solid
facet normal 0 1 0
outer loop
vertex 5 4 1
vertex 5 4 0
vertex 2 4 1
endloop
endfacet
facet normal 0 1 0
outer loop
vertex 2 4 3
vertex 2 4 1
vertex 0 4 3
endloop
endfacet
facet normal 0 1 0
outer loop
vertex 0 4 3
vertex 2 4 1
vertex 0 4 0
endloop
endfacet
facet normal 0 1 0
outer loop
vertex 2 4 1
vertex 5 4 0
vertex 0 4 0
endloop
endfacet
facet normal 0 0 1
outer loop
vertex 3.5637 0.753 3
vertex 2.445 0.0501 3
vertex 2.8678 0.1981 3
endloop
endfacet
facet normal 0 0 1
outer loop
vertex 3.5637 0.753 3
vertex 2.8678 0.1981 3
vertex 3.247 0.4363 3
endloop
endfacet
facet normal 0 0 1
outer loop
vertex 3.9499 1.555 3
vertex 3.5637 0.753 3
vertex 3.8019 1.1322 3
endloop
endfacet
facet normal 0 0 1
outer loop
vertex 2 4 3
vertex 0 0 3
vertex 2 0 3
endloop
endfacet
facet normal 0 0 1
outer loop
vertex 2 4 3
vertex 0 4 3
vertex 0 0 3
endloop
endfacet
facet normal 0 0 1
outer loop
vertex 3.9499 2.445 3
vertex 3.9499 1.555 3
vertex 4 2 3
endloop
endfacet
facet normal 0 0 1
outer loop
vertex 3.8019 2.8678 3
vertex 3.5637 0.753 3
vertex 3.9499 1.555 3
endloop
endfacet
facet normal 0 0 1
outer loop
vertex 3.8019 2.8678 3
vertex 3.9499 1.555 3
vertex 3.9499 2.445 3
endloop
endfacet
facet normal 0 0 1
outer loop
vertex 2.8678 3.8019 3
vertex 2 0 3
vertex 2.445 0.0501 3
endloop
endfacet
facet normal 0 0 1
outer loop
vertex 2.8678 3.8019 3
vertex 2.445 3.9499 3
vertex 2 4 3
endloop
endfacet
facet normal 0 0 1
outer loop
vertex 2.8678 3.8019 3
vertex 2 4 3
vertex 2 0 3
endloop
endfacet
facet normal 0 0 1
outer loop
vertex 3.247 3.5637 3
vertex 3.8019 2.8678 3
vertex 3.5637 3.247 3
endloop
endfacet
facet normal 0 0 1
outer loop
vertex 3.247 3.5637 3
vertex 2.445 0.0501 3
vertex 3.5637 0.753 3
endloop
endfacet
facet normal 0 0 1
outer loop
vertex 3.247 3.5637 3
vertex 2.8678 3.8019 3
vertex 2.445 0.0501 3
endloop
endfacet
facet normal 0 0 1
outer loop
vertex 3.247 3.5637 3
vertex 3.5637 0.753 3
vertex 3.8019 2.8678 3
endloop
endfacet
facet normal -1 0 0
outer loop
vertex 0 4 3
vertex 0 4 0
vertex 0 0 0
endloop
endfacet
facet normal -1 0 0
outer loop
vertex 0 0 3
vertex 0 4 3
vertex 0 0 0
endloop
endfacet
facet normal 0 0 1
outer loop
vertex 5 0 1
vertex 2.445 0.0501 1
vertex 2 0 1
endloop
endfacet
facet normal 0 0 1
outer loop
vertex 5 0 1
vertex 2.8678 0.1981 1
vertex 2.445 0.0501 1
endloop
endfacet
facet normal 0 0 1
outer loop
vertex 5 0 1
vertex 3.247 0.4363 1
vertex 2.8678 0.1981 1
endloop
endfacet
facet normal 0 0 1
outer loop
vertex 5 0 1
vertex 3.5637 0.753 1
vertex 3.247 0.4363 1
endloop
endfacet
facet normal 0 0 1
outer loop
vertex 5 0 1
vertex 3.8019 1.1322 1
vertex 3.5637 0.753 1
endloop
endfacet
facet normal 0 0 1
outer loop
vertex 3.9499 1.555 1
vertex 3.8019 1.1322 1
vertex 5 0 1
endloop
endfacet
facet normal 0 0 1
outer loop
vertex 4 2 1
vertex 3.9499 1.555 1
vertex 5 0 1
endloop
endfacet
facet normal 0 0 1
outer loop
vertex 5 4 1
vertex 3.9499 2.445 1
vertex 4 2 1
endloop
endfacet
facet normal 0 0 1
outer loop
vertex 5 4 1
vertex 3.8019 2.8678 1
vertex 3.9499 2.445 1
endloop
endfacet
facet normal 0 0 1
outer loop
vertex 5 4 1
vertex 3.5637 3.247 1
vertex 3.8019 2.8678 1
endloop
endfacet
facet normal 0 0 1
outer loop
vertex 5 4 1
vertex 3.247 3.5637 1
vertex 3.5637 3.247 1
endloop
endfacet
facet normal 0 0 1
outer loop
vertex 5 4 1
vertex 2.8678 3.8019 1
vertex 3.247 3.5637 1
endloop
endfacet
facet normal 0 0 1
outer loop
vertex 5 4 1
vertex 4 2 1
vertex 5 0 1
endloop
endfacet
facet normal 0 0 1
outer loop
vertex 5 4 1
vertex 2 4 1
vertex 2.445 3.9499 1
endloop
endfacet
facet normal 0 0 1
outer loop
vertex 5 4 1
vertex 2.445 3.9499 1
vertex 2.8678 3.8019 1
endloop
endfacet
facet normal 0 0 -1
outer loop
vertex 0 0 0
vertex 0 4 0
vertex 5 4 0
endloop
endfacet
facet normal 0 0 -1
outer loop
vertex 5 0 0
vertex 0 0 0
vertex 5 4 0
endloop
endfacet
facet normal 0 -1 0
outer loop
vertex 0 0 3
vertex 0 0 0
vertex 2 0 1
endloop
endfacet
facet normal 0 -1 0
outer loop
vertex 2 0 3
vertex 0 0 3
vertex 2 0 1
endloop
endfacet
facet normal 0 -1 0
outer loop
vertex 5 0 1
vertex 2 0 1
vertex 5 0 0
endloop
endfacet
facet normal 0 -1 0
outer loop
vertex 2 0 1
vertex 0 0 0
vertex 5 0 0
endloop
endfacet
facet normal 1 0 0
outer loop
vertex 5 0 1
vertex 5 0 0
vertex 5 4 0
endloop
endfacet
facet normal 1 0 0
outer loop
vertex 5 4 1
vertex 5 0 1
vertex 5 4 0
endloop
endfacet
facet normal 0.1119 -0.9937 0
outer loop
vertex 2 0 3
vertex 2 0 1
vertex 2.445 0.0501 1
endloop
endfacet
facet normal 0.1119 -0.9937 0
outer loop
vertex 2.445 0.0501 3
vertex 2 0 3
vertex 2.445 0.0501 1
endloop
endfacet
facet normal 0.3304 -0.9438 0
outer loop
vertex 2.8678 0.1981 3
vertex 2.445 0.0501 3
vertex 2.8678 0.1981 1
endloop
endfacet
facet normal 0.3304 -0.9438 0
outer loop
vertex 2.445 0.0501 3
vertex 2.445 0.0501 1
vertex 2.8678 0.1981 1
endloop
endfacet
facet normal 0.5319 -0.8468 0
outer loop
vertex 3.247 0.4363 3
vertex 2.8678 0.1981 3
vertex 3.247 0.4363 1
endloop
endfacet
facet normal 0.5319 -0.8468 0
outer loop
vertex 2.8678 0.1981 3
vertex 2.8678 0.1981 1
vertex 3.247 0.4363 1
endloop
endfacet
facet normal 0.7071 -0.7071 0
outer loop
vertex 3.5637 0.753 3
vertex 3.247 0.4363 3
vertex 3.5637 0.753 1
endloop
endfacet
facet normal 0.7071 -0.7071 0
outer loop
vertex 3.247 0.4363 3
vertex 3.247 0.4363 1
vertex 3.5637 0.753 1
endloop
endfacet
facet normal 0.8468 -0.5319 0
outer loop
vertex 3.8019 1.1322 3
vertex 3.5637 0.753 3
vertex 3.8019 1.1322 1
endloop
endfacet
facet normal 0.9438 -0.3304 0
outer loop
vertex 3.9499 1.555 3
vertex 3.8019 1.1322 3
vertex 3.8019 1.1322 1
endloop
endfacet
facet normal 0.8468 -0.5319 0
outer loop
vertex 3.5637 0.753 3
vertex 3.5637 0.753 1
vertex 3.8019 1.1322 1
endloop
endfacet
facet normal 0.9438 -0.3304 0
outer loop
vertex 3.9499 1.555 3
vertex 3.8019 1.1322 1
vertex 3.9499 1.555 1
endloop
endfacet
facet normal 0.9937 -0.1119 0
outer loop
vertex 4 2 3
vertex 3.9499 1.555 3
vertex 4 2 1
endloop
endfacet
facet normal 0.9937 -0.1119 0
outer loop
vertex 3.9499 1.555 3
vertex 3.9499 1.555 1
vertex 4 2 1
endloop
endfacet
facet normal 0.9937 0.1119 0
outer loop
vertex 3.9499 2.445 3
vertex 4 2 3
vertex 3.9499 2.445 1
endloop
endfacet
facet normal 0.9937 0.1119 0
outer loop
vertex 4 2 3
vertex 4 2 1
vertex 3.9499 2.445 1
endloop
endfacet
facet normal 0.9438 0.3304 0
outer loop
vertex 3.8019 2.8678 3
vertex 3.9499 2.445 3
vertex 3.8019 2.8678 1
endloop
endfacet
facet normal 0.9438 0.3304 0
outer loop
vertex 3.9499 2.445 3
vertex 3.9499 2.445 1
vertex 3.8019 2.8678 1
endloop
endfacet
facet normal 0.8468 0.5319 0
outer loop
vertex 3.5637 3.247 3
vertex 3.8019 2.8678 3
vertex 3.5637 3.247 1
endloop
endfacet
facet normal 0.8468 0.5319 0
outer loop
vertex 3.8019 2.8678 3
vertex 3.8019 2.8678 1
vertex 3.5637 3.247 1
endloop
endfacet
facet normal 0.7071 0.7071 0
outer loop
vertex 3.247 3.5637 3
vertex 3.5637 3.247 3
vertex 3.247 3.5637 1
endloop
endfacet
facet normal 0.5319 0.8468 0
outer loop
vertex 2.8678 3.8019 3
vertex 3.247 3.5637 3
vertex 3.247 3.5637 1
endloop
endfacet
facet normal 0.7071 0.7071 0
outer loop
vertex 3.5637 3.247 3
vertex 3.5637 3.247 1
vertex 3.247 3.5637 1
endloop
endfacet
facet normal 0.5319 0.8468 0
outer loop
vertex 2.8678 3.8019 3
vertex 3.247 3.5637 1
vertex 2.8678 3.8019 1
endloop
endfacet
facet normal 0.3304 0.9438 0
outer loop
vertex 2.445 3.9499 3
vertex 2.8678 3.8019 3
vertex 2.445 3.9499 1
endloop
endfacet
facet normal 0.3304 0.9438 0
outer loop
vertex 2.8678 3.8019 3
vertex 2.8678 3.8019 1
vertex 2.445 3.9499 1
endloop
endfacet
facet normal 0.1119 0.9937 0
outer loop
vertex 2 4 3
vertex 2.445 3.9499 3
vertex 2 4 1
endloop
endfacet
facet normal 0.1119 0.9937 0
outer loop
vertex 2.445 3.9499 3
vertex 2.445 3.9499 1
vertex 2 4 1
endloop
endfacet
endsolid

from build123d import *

# Parameters (mm, degrees)
F0_W     = 5
F0_H     = 4
F1_DEPTH = 1
F3_DEPTH = 2


with BuildPart() as f1:
    # F0 (on Top) → F1 (new body)
    with BuildSketch(Plane.XY):
        with Locations((2.5, 2)):
            Rectangle(F0_W, F0_H)
    extrude(amount=F1_DEPTH)

    # F2 (on face) → F3 (join)
    with BuildSketch(Plane.XY.offset(1)):
        with BuildLine():
            Line((0, 0), (2, 0))
            ThreePointArc((2, 0), (4, 2), (2, 4))
            Line((2, 4), (0, 4))
            Line((0, 4), (0, 0))
        make_face()
    extrude(amount=F3_DEPTH)


solid = f1.part
